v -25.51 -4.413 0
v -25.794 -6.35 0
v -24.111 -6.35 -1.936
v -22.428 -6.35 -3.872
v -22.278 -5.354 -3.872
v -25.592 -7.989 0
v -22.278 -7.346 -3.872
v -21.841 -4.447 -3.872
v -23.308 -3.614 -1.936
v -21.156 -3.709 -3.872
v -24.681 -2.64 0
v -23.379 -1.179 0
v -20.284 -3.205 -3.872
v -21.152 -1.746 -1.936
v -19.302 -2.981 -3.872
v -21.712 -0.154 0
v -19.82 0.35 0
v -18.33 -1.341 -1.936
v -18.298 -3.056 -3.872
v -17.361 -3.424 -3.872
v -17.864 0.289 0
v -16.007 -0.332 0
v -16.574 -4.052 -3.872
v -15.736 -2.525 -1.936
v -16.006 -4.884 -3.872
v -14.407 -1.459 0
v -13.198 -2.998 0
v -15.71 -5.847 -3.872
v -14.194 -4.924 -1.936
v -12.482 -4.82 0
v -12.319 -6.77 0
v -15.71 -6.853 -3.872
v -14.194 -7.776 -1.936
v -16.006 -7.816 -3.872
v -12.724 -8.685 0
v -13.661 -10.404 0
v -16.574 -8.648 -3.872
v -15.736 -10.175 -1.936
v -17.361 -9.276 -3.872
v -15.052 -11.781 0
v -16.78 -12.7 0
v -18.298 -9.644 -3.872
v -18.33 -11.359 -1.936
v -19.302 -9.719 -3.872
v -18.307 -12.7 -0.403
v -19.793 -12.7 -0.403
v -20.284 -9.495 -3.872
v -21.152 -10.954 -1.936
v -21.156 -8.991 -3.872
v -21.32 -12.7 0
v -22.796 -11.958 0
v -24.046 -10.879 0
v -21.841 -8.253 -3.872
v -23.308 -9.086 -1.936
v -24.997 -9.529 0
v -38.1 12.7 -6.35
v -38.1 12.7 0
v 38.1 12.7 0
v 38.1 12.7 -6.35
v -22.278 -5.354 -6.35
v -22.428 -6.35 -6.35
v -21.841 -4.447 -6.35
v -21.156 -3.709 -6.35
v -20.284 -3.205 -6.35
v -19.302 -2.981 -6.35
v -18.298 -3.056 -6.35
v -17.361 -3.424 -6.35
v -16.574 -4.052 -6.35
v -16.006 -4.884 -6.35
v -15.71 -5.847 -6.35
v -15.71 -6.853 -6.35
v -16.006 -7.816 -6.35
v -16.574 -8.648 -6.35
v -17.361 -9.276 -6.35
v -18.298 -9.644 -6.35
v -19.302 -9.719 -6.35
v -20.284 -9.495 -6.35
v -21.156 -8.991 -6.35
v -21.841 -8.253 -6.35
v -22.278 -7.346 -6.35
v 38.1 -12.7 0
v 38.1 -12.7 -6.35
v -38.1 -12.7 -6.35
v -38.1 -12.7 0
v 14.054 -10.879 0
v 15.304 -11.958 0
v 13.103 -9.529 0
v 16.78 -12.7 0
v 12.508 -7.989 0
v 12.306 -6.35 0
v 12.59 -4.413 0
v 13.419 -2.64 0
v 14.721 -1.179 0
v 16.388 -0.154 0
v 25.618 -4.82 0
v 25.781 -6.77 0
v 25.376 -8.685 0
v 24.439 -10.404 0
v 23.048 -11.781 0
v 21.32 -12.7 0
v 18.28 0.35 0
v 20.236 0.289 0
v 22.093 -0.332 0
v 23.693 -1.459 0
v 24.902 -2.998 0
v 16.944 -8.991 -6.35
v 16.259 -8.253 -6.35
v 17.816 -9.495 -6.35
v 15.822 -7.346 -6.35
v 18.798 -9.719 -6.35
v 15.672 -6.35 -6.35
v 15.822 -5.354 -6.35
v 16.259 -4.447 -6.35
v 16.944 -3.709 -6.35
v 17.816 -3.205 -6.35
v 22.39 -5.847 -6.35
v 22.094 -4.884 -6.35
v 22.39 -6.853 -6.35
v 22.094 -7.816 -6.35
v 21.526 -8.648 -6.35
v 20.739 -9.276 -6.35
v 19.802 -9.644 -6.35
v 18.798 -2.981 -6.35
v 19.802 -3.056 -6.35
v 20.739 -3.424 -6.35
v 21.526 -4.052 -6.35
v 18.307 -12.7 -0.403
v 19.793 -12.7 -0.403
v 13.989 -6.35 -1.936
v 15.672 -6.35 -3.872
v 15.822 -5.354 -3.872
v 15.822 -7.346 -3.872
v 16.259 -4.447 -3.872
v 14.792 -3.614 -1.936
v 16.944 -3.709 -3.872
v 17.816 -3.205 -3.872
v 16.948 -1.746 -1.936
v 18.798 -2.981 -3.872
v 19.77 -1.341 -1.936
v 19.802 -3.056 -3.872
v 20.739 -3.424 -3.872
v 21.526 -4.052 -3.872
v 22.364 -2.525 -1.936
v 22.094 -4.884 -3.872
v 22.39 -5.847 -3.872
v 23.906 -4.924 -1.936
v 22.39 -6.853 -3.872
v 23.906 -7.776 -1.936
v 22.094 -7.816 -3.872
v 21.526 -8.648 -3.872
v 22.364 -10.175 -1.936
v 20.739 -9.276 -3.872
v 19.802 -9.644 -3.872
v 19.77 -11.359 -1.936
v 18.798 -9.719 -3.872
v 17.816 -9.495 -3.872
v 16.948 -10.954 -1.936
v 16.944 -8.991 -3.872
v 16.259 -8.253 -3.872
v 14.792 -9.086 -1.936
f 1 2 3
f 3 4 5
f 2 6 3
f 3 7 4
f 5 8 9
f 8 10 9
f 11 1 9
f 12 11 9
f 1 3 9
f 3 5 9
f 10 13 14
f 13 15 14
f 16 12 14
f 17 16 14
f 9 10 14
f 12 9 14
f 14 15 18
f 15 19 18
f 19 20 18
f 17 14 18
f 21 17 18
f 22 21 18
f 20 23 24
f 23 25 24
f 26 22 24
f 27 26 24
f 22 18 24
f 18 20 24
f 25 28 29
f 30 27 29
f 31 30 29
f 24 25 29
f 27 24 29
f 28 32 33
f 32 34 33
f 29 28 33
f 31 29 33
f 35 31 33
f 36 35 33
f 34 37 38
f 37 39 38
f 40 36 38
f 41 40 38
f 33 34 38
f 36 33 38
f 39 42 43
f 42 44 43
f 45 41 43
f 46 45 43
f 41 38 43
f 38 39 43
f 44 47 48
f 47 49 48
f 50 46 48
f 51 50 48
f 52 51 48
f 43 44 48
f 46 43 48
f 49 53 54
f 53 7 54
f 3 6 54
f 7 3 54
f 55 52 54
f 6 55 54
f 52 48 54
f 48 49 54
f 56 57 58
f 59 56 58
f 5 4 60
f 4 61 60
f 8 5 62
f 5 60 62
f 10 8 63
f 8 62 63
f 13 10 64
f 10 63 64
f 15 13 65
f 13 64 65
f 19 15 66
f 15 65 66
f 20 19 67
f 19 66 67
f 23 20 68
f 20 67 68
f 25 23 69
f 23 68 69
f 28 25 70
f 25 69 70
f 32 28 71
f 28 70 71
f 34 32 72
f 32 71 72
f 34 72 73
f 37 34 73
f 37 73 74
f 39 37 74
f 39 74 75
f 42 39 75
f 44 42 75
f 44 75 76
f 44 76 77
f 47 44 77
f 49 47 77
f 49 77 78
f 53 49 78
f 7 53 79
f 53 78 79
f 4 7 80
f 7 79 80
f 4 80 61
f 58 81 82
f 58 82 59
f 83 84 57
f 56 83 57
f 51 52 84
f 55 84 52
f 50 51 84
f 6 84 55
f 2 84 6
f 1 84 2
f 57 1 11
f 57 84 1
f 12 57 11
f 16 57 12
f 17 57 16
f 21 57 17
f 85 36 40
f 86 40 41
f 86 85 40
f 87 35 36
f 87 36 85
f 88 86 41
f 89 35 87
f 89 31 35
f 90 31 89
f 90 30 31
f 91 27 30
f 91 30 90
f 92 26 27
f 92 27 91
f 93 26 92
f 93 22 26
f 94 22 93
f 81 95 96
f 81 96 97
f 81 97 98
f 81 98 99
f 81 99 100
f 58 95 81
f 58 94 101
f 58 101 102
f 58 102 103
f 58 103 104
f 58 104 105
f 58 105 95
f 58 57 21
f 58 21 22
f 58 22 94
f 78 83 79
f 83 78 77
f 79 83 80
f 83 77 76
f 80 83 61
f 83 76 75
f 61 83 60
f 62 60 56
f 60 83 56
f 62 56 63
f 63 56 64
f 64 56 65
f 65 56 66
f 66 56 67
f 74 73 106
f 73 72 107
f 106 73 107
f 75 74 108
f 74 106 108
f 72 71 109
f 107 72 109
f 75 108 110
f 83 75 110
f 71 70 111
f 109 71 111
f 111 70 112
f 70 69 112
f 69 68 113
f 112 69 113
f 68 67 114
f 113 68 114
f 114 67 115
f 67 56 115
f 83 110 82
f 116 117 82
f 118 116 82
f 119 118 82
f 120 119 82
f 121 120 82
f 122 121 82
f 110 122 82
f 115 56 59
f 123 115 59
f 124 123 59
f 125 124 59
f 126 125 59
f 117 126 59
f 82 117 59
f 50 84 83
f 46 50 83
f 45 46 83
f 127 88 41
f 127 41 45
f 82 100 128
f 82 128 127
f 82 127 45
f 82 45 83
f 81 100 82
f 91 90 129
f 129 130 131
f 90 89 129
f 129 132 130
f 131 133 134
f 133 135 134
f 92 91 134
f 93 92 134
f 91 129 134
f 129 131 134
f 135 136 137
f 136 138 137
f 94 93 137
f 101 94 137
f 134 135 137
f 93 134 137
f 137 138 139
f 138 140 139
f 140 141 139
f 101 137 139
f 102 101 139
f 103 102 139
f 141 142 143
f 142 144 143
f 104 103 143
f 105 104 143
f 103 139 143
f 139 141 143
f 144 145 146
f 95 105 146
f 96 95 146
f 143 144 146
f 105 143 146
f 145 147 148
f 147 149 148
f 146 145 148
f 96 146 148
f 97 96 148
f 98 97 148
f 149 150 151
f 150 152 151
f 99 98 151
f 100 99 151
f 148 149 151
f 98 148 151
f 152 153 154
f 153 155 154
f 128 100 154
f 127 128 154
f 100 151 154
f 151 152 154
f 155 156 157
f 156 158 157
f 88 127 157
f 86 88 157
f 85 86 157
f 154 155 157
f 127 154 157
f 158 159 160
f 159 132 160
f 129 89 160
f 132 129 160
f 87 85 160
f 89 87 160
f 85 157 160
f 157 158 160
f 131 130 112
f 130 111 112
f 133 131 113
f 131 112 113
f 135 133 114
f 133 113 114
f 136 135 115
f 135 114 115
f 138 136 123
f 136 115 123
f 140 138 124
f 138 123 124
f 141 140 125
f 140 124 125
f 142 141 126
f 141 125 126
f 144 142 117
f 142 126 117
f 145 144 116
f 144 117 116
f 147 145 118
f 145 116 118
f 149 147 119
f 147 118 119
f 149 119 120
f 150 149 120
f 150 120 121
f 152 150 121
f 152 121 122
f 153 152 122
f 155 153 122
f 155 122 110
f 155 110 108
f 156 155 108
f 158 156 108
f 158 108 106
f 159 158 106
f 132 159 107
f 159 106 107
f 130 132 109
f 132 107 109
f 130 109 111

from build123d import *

# Parameters (mm, degrees)
F0_W           = 76.2
F0_H           = 25.4
F0_R           = 3.571875
F1_DEPTH       = 6.35
F2_D           = 6.7564
F2_DEPTH       = 19.05
F2_CSINK_D     = 13.4874
F2_CSINK_ANGLE = 82
F2_TIP         = 2.0298273432


with BuildPart() as f1:
    # F0 (on Top) → F1 (new body)
    with BuildSketch(Plane.XY):
        Rectangle(F0_W, F0_H)
        with Locations((-19.05, -6.35)):
            Circle(F0_R, mode=Mode.SUBTRACT)
        with Locations((19.05, -6.35)):
            Circle(F0_R, mode=Mode.SUBTRACT)
        with Locations((19.05, -6.35)):
            Circle(F0_R)
        with Locations((-19.05, -6.35)):
            Circle(F0_R)
    extrude(amount=-F1_DEPTH)

    # F2
    with Locations(Plane.XY):
        with Locations((-19.05, -6.35), (19.05, -6.35)):
            CounterSinkHole(F2_D / 2, F2_CSINK_D / 2, depth=F2_DEPTH, counter_sink_angle=F2_CSINK_ANGLE)
            with Locations((0, 0, -(F2_DEPTH + F2_TIP / 2))):  # 118° drill point
                Cone(0, F2_D / 2, F2_TIP, mode=Mode.SUBTRACT)


solid = f1.part
